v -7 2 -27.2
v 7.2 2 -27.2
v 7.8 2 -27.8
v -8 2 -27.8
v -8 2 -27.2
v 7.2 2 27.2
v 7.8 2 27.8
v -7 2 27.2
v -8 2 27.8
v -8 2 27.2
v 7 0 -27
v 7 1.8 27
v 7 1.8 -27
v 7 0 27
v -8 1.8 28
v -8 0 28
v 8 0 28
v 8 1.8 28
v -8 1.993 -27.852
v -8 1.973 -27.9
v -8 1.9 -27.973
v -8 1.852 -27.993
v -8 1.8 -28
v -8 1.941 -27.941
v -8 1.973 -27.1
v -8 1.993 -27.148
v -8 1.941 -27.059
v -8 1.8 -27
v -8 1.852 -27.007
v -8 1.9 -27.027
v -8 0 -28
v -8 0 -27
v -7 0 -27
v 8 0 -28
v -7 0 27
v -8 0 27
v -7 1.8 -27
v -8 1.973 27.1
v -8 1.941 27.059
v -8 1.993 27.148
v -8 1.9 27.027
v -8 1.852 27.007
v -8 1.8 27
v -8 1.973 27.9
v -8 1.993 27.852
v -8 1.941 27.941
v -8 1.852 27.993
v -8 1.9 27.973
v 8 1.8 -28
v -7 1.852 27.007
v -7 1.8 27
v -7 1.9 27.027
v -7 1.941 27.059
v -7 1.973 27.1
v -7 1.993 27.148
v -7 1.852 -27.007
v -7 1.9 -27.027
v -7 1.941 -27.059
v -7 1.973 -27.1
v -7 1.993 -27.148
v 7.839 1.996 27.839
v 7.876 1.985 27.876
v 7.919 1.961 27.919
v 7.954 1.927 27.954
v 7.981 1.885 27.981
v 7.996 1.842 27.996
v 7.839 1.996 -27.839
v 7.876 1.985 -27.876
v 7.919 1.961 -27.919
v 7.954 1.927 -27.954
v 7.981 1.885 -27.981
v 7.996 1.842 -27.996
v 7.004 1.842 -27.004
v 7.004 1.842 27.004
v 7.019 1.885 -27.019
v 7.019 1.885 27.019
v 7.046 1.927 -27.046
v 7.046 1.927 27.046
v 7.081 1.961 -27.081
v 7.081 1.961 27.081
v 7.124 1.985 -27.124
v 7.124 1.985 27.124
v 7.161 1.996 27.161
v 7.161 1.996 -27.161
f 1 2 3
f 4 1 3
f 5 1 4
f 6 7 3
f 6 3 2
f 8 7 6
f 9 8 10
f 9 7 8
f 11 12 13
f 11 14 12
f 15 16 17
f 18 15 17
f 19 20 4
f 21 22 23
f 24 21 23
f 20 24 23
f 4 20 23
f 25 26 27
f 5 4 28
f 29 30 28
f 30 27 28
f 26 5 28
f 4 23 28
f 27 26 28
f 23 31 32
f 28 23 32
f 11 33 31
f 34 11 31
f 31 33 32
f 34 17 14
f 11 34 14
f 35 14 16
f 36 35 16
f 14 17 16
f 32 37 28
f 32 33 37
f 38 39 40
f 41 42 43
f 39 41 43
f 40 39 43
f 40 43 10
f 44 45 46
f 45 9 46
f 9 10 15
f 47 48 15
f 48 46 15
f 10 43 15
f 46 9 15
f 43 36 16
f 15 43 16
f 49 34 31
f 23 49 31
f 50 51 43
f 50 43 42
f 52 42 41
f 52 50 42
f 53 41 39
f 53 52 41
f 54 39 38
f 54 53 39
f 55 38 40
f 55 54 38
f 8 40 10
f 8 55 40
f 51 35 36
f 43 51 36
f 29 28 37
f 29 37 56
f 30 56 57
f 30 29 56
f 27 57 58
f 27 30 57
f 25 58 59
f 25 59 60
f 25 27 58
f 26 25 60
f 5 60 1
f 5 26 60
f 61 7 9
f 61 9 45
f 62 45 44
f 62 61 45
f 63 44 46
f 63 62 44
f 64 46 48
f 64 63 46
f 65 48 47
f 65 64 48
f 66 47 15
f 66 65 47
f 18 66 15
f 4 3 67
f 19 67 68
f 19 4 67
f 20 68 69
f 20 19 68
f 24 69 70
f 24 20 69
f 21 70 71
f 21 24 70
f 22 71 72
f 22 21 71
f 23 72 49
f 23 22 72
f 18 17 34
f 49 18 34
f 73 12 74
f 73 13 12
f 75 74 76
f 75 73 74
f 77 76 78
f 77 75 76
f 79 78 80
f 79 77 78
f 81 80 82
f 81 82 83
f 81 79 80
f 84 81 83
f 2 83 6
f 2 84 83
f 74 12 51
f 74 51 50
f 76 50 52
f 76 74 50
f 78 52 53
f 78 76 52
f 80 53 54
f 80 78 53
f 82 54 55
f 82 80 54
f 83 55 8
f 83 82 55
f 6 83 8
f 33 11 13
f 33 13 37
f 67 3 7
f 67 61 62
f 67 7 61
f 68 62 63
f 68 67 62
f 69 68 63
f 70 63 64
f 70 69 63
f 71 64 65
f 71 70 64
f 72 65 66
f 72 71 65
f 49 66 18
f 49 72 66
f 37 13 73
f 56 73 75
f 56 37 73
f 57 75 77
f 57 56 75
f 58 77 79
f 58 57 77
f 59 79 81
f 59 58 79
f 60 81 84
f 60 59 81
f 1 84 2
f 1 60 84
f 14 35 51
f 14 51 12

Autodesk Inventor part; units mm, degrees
ref_plane "YZ Plane" through (0, 0, 0) normal (1, 0, 0) x (0, 1, 0)
ref_plane "XZ Plane" through (0, 0, 0) normal (0, 1, 0) x (-1, 0, 0)
ref_plane "XY Plane" through (0, 0, 0) normal (0, 0, 1) x (1, 0, 0)
sketch "草圖1" plane through (0, 0, 0) normal (0, 1, 0) x (-1, 0, 0)
  line L0 (-8, 28) -> (-8, -28)
  line L1 (-8, -28) -> (8, -28)
  line L2 (8, -28) -> (8, 28)
  line L3 (8, 28) -> (-8, 28)
  line L4 (-8, 28) -> (8, -28) construction
  line L5 (-8, -28) -> (8, 28) construction
  line L6 (-7, 27) -> (-7, -27)
  line L7 (-7, -27) -> (7, -27)
  line L8 (7, -27) -> (7, 27)
  line L9 (7, 27) -> (-7, 27)
  line L10 (-7, 27) -> (7, -27) construction
  line L11 (-7, -27) -> (7, 27) construction
  line L12 (7, 27) -> (8, 27)
  line L13 (7, -27) -> (8, -27)
  point P0 (0, 0)
  dimension "d0" = 56
  dimension "d1" = 16
  dimension "d2" = 54
  dimension "d3" = 14
extrude "擠出1" add sketch "草圖1" along normal blind 2 contours L3 L2 L12 L9 L6 L7 L13 L1 L0
fillet "圓角1" radius 0.2 6 edges at (0, 2, 27) (7, 2, 0) (8, 2, 0) (0, 2, 28) (0, 2, -27) (0, 2, -28)
properties part number "矮牆"
